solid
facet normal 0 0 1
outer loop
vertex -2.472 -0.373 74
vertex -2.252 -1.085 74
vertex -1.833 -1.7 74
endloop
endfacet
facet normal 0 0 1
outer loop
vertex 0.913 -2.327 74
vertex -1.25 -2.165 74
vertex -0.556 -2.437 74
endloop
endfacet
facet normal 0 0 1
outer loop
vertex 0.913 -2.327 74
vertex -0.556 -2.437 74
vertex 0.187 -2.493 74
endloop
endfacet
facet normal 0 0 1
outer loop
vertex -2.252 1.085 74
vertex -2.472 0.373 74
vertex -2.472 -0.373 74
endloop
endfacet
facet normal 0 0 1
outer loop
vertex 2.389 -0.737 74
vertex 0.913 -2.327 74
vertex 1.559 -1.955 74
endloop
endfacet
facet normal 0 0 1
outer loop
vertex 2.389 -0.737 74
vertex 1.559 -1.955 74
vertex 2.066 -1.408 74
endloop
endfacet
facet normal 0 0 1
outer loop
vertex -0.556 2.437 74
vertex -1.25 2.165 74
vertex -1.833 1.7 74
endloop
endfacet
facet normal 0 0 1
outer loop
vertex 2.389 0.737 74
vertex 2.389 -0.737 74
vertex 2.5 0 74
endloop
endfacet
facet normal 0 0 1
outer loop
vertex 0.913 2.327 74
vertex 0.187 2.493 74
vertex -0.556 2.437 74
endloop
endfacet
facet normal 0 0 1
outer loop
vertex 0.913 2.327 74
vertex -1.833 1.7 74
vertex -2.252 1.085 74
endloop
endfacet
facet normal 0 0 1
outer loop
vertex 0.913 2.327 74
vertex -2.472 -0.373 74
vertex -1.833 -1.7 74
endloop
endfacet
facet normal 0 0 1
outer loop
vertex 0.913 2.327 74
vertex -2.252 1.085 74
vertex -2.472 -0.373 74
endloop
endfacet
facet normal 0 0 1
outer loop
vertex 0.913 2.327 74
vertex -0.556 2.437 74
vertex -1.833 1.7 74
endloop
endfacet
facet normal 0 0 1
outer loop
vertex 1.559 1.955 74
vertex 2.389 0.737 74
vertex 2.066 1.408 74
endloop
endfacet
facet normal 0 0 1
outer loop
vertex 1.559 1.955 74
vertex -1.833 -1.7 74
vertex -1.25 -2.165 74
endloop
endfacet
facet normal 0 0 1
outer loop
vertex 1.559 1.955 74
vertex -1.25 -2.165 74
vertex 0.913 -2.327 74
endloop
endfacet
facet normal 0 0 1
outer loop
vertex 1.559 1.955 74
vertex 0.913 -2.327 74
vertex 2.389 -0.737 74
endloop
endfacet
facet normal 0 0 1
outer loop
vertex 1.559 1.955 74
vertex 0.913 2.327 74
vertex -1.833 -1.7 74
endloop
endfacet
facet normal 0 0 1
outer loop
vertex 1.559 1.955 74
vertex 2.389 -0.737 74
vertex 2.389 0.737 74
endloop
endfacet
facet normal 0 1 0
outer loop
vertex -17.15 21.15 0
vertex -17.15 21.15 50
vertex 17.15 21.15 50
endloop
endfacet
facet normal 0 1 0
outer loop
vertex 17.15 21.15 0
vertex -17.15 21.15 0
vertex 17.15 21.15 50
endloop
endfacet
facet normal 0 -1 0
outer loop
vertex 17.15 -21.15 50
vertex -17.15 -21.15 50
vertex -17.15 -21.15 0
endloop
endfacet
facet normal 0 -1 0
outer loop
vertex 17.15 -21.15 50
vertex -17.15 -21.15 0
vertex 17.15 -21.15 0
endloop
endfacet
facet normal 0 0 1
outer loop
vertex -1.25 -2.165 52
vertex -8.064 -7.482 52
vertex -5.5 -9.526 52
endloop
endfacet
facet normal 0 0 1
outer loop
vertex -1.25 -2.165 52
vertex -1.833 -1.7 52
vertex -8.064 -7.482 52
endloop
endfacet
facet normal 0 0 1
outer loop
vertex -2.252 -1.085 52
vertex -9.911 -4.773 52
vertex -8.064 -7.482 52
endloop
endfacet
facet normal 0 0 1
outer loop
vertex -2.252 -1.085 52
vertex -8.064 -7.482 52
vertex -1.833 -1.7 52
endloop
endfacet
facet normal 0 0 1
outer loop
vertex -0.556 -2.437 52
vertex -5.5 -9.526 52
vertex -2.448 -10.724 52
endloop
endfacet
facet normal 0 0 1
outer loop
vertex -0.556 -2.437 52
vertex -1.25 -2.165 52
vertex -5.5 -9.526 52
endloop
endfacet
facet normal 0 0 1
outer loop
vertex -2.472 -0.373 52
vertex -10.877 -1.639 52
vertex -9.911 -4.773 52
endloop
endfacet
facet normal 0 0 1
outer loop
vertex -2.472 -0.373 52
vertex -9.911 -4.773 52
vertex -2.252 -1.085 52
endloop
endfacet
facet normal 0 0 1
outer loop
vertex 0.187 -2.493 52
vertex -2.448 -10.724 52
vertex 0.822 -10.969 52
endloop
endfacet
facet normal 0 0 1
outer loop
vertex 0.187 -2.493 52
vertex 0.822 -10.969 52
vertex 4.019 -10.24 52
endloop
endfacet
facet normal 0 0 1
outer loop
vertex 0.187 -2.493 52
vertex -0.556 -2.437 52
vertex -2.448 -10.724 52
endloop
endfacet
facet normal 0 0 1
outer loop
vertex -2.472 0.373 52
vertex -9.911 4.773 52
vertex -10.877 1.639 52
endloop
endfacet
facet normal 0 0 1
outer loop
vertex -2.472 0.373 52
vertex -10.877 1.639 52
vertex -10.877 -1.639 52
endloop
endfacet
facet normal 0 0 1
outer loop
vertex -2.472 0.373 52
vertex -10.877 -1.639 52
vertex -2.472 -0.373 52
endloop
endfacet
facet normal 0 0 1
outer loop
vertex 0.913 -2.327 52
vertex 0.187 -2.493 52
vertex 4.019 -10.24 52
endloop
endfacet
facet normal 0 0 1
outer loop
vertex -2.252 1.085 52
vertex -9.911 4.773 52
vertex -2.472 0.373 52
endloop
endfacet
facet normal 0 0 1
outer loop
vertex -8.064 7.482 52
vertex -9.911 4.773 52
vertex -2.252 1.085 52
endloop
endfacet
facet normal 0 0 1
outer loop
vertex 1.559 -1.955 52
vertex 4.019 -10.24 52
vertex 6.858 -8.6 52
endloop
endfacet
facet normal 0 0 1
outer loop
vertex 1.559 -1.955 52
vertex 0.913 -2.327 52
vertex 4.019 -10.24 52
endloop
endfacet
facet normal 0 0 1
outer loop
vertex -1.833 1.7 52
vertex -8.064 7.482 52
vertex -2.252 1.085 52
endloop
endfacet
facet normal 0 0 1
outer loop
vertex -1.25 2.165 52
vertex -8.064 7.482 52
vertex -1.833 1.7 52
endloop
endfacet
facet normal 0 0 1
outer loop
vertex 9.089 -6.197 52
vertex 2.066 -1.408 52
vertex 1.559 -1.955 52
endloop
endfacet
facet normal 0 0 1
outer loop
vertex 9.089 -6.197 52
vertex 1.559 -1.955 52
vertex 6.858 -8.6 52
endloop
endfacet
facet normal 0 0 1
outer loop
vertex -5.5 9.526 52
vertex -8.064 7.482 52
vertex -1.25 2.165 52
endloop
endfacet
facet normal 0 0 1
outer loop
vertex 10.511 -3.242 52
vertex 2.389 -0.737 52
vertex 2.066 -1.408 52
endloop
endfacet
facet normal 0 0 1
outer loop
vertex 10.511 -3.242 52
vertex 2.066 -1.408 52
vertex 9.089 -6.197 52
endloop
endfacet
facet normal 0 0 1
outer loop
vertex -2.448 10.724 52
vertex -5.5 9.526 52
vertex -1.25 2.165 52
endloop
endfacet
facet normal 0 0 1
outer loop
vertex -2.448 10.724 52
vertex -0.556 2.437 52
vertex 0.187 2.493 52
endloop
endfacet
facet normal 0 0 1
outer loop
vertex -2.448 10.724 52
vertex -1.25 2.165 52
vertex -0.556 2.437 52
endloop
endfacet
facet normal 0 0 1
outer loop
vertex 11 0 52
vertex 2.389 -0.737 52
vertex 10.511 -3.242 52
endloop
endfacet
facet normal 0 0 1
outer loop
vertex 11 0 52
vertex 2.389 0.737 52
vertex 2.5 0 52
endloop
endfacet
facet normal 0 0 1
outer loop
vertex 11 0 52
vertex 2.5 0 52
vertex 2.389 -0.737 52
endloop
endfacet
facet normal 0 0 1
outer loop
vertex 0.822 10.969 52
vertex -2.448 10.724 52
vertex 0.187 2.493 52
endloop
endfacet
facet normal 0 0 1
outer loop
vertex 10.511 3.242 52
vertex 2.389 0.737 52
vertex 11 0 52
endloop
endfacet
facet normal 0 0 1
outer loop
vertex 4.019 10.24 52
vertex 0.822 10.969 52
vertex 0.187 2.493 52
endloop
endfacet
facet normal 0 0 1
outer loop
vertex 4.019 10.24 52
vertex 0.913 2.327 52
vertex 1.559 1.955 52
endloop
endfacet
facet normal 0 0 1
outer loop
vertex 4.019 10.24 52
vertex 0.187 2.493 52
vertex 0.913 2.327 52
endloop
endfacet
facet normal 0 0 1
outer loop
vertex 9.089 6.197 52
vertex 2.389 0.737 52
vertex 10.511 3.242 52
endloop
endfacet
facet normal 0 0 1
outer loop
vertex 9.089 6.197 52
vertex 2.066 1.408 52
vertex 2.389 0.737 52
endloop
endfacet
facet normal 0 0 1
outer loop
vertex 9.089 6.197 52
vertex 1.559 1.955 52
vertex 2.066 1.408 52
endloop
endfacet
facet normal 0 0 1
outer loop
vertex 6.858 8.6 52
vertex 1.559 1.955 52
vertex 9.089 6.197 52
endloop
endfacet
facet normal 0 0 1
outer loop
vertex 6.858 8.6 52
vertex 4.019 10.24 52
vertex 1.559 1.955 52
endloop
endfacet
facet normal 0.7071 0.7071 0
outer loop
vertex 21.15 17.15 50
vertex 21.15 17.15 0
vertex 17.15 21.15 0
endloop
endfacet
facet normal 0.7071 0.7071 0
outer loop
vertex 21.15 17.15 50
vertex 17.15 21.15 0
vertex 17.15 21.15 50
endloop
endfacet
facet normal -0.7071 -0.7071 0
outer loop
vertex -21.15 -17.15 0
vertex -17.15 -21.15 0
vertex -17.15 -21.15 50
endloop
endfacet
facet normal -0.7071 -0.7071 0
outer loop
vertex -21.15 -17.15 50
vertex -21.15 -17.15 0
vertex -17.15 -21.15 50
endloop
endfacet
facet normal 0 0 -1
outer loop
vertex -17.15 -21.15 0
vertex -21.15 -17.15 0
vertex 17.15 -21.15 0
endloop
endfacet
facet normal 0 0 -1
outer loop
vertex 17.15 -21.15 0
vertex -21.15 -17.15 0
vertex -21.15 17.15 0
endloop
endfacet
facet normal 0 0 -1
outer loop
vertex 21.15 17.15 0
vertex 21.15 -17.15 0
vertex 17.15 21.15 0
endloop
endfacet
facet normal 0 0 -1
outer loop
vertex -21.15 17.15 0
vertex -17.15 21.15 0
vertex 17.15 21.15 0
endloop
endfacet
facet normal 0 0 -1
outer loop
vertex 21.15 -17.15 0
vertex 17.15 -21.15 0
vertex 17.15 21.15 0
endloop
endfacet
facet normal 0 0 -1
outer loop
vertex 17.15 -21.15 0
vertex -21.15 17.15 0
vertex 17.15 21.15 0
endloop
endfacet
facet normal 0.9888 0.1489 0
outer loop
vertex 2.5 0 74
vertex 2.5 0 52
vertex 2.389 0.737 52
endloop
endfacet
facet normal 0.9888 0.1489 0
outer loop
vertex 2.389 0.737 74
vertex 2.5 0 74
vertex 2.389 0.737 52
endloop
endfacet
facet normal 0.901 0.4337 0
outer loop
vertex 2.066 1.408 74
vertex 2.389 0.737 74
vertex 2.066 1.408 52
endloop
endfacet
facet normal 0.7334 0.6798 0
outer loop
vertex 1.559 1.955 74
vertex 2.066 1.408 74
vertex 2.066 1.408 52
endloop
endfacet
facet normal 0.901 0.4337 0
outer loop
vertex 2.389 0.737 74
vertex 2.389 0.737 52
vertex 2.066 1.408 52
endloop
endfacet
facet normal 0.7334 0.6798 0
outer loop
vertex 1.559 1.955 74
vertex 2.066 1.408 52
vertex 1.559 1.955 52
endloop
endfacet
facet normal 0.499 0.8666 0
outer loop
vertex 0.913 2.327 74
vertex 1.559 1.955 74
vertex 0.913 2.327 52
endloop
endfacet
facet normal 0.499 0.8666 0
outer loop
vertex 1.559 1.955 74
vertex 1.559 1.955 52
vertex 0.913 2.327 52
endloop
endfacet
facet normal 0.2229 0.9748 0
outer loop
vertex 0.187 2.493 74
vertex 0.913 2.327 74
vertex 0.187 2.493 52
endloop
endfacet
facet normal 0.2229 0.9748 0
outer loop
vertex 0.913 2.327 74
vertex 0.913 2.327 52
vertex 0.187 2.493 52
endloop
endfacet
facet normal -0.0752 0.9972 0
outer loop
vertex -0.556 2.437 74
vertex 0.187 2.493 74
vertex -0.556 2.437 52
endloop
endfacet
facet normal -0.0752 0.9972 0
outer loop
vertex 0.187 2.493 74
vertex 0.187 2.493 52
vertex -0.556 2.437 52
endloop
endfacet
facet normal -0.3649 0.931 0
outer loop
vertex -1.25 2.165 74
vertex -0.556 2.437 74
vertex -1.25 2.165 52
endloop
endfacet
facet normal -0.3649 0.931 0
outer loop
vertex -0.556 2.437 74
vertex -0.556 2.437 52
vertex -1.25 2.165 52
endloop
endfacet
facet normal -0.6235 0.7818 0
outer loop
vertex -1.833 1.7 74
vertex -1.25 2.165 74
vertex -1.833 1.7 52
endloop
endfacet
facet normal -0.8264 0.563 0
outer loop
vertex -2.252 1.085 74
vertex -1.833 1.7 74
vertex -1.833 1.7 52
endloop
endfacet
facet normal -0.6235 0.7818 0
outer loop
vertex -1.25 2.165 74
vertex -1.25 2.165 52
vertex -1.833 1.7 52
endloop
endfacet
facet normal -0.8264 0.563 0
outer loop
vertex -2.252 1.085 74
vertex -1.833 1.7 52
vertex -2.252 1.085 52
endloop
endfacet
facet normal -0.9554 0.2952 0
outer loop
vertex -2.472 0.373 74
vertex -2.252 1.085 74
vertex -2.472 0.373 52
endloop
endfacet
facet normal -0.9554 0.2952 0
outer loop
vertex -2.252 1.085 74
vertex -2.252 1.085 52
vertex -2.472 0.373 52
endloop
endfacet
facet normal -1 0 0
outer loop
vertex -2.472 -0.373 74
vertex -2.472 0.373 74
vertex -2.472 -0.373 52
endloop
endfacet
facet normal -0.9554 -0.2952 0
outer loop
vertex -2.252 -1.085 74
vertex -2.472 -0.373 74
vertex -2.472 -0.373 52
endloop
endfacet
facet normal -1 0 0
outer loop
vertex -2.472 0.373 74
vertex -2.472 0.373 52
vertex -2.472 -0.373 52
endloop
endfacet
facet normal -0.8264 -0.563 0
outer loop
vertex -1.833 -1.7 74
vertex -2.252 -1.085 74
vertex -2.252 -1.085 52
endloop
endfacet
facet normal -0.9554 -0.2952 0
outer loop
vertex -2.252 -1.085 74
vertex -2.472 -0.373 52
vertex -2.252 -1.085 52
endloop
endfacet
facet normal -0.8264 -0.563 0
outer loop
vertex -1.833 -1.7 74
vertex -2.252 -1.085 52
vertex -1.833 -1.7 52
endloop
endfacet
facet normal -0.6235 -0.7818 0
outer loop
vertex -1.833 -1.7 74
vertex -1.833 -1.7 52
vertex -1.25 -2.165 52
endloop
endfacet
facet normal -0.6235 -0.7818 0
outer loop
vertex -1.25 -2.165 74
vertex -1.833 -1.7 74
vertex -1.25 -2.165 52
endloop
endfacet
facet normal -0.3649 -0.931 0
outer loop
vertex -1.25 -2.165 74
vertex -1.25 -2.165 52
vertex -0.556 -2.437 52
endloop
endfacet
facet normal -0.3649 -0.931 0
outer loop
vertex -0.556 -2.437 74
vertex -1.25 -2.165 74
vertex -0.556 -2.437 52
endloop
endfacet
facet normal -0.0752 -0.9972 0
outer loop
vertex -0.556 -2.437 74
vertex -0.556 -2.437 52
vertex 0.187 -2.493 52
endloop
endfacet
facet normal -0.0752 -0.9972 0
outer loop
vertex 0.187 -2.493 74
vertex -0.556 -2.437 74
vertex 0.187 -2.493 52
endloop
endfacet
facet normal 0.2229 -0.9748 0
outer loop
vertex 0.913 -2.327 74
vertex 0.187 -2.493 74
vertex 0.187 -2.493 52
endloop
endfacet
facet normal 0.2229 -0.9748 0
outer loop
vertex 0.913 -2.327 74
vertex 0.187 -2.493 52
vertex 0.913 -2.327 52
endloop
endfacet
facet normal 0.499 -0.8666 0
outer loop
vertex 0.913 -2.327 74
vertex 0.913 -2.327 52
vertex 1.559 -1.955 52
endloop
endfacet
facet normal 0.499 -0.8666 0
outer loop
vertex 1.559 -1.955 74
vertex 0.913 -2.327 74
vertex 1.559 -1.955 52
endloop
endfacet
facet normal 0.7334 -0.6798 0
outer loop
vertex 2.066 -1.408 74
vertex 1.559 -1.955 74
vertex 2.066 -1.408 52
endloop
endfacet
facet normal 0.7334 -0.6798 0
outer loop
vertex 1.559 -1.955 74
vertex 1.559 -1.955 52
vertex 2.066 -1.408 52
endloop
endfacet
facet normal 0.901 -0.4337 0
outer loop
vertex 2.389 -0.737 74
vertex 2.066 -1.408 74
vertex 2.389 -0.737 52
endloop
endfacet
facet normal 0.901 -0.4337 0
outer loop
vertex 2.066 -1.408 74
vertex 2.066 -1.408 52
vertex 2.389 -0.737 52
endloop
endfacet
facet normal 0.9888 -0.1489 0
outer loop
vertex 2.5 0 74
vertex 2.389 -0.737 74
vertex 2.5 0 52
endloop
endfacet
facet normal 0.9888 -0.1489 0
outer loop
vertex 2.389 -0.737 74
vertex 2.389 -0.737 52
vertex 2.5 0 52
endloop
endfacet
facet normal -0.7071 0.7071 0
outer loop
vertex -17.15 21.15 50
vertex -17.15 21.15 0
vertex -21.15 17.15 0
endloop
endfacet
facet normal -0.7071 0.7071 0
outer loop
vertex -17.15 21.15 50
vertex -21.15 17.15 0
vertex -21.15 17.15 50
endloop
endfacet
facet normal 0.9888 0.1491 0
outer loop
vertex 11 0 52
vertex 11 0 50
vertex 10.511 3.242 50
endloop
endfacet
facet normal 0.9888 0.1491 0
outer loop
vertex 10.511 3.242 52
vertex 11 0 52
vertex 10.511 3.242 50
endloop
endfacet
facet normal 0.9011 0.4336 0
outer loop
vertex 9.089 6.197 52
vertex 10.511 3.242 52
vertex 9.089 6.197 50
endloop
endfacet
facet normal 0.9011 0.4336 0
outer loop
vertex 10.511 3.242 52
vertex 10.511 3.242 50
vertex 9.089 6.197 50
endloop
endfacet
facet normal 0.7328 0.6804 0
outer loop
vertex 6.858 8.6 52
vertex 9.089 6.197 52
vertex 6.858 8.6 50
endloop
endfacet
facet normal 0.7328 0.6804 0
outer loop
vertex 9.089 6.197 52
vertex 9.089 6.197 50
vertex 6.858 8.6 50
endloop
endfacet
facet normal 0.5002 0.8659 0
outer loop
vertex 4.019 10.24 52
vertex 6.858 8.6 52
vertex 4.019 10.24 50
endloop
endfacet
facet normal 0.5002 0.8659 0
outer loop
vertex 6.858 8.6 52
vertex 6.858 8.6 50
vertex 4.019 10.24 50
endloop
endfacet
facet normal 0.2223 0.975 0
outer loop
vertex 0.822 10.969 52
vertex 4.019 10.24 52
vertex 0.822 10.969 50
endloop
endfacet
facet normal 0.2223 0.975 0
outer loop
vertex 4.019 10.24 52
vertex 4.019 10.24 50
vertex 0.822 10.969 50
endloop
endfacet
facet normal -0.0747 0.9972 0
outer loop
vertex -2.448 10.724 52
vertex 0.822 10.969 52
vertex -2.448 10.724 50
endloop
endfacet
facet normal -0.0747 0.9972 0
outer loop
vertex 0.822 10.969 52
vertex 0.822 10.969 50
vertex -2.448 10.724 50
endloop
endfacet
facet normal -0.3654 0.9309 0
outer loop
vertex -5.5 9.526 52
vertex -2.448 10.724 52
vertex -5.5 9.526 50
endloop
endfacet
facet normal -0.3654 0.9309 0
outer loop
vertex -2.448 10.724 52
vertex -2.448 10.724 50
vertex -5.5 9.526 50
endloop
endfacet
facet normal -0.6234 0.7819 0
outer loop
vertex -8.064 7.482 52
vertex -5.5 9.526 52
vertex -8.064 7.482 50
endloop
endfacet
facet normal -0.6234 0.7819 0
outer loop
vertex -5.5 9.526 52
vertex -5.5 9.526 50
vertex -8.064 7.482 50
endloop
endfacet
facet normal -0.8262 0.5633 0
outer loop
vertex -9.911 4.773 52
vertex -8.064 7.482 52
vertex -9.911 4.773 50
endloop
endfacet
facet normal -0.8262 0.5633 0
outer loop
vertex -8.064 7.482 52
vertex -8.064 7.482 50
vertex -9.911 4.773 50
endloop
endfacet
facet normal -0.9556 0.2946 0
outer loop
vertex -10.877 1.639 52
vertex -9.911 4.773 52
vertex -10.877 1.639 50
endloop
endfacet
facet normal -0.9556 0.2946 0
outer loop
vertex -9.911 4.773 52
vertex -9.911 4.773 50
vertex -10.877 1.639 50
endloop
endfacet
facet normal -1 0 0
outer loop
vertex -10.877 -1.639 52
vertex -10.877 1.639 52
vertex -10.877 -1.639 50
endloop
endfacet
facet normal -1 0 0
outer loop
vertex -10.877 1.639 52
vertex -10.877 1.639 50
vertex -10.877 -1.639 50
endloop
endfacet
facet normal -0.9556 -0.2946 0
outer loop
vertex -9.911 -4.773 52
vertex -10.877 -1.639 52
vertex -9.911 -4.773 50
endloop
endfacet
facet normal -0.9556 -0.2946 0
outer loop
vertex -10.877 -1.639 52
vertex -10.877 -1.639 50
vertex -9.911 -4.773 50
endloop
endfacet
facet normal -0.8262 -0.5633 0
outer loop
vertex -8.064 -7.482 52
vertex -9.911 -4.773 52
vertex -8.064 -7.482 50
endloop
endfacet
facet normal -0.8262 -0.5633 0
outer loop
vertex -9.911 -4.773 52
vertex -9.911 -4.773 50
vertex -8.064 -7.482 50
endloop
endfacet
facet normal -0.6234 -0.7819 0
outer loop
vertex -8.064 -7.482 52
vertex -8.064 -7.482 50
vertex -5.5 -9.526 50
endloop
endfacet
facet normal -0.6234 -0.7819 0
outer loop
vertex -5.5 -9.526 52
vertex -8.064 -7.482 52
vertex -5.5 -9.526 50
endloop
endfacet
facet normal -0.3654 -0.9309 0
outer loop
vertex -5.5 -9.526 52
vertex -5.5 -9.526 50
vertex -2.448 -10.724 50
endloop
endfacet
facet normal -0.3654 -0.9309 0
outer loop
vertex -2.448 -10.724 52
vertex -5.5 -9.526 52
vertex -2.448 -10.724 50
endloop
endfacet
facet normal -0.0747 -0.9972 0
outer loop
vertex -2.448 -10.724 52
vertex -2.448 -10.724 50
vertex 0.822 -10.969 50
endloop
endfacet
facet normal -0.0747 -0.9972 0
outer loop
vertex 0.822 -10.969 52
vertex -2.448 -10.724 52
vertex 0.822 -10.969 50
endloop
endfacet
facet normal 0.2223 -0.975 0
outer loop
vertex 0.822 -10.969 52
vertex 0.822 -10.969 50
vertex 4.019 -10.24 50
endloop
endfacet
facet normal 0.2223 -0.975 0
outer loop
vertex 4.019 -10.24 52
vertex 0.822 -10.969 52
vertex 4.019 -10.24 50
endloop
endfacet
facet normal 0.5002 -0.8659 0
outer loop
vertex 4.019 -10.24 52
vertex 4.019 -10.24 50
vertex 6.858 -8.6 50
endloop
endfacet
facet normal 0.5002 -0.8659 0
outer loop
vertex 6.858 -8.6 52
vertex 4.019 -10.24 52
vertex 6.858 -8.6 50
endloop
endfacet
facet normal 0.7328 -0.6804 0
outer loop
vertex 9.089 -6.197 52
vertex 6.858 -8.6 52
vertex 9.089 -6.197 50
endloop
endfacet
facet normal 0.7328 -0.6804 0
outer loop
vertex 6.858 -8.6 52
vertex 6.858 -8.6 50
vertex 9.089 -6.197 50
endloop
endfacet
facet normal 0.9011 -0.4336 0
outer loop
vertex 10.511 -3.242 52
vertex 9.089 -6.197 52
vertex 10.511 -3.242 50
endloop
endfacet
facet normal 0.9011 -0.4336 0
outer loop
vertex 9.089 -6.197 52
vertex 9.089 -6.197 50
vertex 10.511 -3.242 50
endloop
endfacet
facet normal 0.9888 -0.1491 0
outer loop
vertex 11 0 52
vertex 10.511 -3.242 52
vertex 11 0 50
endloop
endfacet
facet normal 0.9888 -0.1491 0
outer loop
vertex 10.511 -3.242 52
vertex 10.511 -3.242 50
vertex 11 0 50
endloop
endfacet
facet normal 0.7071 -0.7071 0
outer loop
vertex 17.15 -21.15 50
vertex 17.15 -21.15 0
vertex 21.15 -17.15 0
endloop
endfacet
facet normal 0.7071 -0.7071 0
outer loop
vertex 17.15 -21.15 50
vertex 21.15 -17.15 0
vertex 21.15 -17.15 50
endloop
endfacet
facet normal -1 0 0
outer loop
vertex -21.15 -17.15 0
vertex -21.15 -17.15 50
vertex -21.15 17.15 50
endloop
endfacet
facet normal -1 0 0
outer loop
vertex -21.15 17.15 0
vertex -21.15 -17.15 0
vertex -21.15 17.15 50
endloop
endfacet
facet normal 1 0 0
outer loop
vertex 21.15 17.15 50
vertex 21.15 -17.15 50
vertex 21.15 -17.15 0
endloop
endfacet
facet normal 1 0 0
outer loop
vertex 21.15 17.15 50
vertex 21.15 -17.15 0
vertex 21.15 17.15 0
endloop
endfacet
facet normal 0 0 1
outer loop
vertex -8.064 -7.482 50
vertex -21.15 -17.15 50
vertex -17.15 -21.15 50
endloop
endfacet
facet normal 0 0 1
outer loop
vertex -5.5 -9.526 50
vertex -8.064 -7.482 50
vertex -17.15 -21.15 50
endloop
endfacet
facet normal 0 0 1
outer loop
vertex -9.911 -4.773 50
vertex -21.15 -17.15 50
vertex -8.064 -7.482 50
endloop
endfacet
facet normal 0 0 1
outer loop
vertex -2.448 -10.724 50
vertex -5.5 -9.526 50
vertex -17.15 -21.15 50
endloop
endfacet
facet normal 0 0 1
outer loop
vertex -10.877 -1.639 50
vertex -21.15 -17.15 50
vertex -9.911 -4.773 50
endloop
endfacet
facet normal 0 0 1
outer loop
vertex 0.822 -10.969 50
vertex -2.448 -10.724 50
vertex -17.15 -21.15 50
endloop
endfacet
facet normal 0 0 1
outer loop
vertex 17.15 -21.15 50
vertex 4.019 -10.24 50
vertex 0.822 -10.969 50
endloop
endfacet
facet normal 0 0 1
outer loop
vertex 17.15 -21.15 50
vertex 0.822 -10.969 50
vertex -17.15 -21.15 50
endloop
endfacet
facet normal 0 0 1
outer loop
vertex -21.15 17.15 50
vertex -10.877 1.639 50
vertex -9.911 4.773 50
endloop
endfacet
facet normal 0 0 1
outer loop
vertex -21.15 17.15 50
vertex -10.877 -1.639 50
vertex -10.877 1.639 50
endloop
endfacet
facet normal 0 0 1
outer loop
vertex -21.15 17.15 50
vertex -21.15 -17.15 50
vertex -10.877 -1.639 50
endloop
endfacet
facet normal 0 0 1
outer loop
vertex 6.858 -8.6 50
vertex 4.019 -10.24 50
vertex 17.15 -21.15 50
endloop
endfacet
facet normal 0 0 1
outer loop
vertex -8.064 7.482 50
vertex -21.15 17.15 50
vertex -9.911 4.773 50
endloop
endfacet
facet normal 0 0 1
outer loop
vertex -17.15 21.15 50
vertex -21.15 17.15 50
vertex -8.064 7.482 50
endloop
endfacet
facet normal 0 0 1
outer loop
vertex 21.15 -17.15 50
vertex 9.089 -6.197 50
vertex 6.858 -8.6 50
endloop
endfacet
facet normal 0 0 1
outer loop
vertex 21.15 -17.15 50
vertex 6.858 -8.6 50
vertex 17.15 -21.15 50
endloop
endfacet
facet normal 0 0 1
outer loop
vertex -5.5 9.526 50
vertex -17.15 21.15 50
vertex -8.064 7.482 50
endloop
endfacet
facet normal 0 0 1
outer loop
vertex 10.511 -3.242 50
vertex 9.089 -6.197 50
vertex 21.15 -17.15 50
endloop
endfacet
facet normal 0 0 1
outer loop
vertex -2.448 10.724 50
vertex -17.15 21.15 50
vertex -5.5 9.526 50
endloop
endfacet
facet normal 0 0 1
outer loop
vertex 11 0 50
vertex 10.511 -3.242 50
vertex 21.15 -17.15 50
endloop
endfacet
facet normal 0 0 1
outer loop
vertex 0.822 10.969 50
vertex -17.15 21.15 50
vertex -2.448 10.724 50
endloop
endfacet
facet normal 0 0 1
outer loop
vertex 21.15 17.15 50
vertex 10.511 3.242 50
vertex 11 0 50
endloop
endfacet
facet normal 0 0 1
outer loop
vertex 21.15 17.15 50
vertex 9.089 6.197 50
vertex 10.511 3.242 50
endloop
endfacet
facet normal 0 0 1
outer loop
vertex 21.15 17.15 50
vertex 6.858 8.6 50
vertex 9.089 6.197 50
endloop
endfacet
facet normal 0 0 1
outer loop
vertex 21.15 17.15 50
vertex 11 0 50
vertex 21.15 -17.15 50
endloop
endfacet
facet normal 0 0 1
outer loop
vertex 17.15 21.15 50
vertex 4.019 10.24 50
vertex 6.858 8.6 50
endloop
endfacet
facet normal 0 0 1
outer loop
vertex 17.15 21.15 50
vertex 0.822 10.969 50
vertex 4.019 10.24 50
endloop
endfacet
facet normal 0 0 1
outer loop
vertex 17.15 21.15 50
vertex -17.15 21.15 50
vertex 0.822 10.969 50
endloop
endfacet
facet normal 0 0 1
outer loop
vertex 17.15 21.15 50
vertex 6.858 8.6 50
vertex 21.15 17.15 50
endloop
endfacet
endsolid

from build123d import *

# Parameters (mm, degrees)
SKETCH_W        = 42.3
SKETCH_H        = 42.3
PAD_DEPTH       = 50
SKETCH001_R     = 11
PAD001_DEPTH    = 2
SKETCH002_R     = 2.5
PAD002_DEPTH    = 22
CHAMFER_SIZE    = 4
CHAMFER001_SIZE = 4
CHAMFER002_SIZE = 4
CHAMFER003_SIZE = 4


with BuildPart() as part:
    # Sketch → Pad (new body)
    with BuildSketch(Plane.XY):
        Rectangle(SKETCH_W, SKETCH_H)
    extrude(amount=PAD_DEPTH)

    # Sketch001 → Pad001 (new body)
    with BuildSketch(Plane.XY.offset(50)):
        Circle(SKETCH001_R)
    extrude(amount=PAD001_DEPTH)

    # Sketch002 → Pad002 (new body)
    with BuildSketch(Plane.XY.offset(52)):
        Circle(SKETCH002_R)
    extrude(amount=PAD002_DEPTH)

    # Chamfer
    chamfer_edges = [part.edges().sort_by_distance(p)[0] for p in [
        (-21.15, -21.15, 25),
    ]]
    chamfer(chamfer_edges, length=CHAMFER_SIZE)

    # Chamfer001
    chamfer001_edges = [part.edges().sort_by_distance(p)[0] for p in [
        (-21.15, 21.15, 25),
    ]]
    chamfer(chamfer001_edges, length=CHAMFER001_SIZE)

    # Chamfer002
    chamfer002_edges = [part.edges().sort_by_distance(p)[0] for p in [
        (21.15, 21.15, 25),
    ]]
    chamfer(chamfer002_edges, length=CHAMFER002_SIZE)

    # Chamfer003
    chamfer003_edges = [part.edges().sort_by_distance(p)[0] for p in [
        (21.15, -21.15, 25),
    ]]
    chamfer(chamfer003_edges, length=CHAMFER003_SIZE)


solid = part.part
